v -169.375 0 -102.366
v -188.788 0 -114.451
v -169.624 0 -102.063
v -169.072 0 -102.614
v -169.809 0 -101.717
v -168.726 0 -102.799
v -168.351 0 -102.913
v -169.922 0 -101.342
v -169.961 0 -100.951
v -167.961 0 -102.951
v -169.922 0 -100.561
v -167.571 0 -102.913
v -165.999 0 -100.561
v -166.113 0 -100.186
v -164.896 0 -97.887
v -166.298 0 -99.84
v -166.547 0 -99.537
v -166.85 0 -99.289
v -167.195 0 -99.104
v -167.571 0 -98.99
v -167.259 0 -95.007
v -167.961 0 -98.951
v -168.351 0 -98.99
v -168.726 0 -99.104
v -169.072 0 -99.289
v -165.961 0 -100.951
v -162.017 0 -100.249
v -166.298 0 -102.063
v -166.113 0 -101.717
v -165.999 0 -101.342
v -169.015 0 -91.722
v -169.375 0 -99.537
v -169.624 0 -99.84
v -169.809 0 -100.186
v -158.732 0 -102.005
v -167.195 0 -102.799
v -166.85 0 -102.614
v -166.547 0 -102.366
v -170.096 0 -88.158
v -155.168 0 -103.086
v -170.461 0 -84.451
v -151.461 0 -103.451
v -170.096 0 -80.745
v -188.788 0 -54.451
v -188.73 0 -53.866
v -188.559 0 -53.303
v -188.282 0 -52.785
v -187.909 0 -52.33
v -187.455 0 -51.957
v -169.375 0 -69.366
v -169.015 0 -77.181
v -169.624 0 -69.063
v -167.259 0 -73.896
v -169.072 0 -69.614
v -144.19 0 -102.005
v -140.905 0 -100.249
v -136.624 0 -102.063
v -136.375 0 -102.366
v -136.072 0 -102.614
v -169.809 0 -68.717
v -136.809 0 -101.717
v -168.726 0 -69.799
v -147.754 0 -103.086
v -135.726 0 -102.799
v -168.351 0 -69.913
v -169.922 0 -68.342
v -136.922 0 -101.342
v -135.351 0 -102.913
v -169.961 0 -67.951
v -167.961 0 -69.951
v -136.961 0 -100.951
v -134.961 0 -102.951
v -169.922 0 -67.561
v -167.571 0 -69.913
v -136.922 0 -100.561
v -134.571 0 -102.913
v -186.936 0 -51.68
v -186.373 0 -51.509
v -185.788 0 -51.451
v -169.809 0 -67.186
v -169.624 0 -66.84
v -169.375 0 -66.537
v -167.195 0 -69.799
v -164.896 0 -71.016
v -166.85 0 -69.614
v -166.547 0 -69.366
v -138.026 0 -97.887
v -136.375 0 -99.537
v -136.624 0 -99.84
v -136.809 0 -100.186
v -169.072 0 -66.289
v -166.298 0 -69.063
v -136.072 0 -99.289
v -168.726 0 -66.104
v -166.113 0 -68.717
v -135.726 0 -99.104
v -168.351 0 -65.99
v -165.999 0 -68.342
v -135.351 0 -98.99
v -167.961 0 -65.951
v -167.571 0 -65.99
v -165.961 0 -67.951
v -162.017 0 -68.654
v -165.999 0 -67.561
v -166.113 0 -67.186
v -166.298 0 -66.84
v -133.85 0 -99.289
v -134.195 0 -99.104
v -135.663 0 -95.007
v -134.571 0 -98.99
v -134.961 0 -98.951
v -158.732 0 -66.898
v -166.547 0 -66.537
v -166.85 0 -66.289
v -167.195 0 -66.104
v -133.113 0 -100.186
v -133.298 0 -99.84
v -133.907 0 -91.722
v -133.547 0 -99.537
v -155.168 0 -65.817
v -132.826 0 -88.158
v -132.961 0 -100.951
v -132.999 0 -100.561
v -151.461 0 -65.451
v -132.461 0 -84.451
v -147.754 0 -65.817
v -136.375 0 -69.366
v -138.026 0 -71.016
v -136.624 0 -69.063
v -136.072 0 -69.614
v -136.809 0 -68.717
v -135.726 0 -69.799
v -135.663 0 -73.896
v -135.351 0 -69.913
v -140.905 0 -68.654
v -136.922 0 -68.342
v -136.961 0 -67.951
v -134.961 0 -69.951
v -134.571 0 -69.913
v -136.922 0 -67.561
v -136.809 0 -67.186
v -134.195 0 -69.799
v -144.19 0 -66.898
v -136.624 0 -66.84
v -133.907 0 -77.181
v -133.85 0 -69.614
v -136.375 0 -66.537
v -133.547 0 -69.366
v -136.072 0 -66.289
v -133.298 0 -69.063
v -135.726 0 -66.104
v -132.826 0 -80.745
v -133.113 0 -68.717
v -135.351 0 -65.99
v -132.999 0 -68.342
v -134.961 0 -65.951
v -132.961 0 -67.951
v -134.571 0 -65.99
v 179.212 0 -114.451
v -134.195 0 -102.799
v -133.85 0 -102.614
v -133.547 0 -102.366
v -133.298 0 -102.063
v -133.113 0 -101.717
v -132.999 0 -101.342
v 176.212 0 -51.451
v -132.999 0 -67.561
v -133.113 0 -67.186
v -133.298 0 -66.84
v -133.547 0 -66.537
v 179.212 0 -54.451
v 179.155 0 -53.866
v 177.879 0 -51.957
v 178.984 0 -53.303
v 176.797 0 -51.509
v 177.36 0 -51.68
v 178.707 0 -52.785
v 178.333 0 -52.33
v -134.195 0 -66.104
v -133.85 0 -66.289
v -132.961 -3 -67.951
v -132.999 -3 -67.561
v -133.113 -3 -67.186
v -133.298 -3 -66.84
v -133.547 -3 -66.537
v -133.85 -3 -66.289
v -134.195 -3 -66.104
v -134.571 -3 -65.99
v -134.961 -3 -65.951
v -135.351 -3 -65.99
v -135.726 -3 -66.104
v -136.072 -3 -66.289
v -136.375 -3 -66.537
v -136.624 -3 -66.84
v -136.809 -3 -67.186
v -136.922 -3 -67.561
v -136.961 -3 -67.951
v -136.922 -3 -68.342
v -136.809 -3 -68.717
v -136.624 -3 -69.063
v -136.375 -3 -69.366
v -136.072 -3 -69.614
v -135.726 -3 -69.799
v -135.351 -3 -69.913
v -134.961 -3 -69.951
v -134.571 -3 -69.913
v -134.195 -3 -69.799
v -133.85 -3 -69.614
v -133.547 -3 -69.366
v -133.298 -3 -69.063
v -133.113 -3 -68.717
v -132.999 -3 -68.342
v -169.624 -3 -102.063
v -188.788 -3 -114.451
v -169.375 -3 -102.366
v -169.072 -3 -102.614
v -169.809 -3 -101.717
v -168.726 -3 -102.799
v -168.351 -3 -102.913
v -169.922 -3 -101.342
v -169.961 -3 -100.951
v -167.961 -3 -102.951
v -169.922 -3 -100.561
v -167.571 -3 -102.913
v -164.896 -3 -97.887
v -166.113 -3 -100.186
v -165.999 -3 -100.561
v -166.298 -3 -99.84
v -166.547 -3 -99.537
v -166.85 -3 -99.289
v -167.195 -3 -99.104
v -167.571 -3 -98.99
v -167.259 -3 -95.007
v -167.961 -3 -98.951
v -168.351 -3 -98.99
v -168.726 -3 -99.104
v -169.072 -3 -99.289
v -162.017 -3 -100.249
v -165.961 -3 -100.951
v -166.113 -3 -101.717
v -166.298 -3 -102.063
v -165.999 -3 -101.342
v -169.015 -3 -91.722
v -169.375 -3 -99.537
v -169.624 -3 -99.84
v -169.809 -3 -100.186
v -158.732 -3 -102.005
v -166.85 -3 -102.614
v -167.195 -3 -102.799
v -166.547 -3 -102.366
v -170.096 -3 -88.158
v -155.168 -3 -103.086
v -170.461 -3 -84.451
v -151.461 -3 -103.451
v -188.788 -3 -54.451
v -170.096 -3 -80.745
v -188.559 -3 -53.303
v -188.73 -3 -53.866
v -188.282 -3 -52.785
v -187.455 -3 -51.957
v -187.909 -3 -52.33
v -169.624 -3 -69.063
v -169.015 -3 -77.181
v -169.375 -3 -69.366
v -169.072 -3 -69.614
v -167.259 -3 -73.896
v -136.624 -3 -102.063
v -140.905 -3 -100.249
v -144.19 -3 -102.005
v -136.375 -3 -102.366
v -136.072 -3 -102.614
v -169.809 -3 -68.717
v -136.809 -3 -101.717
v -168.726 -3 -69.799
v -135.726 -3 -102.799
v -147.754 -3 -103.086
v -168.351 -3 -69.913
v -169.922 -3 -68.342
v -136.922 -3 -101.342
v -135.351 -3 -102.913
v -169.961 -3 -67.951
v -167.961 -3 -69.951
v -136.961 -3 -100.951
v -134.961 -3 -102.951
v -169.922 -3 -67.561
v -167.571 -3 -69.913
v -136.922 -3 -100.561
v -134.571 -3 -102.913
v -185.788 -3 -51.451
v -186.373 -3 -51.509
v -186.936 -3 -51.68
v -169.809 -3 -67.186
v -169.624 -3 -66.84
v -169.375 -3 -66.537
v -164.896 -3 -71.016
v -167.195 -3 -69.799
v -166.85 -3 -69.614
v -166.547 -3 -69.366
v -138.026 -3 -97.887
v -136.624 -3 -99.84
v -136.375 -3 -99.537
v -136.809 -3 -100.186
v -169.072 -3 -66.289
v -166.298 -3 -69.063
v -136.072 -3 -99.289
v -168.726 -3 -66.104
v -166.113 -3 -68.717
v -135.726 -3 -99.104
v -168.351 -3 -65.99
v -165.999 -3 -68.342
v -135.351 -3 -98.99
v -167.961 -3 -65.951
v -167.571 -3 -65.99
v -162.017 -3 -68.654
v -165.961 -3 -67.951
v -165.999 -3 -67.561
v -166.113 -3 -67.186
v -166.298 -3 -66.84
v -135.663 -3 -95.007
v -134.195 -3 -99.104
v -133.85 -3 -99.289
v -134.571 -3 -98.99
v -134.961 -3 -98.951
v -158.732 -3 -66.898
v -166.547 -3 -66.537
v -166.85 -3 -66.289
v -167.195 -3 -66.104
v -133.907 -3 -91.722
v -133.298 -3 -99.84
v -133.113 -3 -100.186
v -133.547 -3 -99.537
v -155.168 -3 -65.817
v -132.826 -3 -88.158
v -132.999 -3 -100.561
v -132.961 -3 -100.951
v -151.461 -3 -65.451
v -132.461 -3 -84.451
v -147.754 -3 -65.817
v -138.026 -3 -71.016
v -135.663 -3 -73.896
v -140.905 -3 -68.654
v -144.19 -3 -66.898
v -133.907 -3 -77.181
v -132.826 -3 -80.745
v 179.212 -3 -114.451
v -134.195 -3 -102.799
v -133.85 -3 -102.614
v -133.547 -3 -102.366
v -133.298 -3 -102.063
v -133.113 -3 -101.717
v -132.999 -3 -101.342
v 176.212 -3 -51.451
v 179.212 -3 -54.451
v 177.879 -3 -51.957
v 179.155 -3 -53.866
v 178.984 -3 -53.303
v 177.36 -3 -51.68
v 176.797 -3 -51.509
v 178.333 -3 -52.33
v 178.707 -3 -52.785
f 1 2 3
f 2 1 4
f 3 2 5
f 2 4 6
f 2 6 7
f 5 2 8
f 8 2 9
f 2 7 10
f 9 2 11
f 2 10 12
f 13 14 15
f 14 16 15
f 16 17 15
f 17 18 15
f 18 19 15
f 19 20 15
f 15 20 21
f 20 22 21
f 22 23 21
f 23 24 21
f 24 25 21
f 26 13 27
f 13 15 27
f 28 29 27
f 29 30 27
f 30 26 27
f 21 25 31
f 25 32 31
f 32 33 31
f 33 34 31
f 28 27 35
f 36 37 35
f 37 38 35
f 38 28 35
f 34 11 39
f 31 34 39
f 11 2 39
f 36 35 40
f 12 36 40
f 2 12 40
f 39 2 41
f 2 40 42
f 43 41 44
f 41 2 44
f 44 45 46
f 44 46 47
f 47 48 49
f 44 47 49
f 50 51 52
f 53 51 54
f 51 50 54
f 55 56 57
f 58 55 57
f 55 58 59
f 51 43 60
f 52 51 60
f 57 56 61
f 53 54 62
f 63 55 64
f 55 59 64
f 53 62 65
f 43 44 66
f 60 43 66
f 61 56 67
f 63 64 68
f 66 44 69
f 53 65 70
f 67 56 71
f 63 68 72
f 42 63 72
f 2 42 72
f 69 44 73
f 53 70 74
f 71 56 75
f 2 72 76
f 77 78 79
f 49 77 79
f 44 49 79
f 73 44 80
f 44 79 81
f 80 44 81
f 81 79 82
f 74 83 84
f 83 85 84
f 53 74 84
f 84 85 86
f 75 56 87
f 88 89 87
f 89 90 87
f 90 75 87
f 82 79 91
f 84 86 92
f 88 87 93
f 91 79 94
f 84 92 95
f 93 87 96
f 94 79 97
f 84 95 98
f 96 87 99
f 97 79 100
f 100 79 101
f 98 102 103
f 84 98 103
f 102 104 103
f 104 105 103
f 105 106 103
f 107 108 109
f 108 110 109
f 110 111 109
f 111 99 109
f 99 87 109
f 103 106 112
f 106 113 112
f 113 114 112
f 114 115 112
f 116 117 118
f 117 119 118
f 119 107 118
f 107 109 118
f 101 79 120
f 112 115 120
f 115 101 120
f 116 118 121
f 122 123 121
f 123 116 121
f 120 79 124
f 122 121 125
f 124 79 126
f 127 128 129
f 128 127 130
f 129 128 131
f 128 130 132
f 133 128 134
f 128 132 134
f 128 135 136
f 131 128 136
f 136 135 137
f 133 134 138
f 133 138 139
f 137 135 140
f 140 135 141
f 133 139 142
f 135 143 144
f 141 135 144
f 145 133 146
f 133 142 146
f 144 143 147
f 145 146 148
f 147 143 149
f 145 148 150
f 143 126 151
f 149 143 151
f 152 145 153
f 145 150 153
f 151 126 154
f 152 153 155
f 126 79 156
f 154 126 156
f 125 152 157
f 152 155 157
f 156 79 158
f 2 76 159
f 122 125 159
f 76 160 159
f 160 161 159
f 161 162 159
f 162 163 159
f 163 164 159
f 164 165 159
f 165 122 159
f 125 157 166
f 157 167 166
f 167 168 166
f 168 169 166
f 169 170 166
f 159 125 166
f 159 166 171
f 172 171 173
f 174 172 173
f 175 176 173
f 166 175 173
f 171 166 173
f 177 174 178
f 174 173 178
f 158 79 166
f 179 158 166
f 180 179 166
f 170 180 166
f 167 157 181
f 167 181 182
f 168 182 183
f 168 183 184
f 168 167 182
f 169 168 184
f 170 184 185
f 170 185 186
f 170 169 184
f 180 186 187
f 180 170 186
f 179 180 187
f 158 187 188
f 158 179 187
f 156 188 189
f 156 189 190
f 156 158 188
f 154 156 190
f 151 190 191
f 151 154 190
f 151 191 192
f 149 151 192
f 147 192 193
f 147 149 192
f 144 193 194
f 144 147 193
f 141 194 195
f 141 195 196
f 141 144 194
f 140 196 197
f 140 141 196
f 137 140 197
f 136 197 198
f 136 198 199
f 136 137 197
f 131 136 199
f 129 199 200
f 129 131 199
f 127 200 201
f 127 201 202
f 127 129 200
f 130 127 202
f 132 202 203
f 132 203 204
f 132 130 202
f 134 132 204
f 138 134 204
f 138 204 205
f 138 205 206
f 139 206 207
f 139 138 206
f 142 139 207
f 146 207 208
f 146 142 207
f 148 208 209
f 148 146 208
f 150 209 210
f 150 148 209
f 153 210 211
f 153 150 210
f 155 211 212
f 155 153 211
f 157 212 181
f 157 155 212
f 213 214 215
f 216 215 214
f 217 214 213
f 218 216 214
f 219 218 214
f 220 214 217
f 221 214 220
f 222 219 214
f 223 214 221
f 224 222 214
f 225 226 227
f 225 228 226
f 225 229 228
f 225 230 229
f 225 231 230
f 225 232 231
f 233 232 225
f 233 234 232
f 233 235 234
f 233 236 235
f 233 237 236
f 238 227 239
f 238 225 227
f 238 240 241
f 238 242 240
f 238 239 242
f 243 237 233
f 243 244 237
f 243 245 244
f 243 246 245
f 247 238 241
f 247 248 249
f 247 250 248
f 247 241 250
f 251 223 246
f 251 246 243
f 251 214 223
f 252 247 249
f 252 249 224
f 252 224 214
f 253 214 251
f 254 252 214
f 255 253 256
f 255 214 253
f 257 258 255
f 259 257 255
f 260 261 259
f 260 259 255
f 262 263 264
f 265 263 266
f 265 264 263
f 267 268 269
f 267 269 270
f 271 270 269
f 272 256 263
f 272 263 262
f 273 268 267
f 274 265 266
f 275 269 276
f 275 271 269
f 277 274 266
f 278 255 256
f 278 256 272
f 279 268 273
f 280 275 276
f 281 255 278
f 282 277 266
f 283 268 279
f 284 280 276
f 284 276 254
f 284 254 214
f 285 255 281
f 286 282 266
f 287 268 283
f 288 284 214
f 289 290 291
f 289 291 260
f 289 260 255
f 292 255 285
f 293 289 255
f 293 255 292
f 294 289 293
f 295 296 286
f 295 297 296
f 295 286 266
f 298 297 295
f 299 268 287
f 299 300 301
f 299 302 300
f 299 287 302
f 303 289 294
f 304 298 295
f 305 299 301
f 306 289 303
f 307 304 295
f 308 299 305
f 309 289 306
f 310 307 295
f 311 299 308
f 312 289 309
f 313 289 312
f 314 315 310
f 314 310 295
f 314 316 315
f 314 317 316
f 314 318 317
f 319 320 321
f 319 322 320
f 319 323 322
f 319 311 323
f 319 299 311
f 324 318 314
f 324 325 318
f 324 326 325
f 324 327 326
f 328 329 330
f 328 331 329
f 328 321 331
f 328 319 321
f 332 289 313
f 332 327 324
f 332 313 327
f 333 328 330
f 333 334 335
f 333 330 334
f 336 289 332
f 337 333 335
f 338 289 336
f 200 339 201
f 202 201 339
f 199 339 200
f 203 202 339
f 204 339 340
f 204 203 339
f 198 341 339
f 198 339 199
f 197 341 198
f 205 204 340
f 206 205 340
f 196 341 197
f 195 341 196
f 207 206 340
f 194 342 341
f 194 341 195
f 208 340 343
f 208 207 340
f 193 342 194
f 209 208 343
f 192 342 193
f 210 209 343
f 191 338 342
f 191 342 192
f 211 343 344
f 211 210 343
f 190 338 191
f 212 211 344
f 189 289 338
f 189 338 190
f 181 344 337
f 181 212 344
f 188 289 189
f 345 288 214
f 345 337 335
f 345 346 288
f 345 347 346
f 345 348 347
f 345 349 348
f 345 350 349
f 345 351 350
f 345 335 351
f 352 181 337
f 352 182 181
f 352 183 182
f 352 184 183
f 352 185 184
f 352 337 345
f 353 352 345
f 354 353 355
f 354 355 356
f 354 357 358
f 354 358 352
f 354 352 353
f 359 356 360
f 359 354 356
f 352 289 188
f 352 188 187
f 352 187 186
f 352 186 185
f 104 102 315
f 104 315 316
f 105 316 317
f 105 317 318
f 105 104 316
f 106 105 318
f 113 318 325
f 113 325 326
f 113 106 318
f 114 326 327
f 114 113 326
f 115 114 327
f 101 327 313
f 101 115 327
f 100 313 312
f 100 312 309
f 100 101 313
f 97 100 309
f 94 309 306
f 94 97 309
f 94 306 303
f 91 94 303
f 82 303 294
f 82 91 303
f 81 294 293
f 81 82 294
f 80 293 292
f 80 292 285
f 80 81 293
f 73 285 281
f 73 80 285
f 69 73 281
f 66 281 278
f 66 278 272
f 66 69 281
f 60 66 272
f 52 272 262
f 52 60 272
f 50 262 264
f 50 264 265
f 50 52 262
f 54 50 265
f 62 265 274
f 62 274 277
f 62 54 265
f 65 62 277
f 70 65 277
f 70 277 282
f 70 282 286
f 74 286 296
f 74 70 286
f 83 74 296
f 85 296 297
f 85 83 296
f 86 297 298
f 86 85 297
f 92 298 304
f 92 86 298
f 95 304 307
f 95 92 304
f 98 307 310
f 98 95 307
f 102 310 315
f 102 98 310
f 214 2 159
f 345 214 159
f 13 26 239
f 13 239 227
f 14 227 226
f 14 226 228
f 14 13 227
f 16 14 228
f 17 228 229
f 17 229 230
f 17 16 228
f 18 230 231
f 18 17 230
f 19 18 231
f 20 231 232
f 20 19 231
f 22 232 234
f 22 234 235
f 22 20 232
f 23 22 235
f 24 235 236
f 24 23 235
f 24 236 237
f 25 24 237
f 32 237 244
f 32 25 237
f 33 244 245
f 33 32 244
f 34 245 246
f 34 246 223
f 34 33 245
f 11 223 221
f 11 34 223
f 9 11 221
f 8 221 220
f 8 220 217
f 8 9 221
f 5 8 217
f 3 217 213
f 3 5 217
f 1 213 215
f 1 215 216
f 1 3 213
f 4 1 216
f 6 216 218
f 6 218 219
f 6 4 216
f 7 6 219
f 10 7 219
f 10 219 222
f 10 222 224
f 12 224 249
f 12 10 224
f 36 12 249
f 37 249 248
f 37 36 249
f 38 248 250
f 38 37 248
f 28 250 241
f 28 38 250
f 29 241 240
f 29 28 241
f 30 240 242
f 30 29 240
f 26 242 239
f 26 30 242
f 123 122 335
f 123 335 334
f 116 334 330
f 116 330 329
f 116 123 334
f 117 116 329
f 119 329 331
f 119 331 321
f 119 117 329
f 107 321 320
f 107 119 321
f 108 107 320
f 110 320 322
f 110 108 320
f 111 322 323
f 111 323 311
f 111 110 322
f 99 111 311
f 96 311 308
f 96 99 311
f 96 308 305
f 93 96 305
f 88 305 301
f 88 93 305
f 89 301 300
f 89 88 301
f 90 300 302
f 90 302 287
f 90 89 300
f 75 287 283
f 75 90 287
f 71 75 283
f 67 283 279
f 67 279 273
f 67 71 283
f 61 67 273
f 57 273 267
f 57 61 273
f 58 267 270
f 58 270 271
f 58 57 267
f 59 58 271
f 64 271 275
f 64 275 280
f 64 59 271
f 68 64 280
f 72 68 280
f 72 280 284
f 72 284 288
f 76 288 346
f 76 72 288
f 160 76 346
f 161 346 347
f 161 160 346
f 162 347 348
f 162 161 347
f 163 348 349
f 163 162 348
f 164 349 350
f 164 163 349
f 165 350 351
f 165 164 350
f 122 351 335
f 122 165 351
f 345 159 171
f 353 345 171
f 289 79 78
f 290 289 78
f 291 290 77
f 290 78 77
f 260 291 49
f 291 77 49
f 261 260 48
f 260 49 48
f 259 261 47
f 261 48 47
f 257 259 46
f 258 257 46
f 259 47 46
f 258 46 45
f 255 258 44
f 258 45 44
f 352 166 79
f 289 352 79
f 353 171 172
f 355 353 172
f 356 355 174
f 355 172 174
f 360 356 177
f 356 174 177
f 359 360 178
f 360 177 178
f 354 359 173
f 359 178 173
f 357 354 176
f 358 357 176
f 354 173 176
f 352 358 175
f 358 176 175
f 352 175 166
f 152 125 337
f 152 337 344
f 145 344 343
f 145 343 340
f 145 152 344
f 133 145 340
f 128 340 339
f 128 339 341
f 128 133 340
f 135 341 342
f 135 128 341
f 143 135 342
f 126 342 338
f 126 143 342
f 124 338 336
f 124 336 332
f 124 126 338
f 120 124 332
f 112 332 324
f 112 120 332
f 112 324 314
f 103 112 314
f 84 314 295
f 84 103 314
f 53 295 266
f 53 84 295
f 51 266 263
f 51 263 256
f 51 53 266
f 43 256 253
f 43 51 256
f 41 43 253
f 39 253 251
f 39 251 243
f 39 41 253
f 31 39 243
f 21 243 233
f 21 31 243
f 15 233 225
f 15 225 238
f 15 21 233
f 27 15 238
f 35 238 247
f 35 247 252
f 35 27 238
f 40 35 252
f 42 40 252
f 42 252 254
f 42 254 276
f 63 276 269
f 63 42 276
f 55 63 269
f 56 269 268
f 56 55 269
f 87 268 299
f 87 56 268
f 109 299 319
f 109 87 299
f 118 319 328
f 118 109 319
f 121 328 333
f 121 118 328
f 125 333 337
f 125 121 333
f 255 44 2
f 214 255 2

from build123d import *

# Parameters (mm, degrees)
F0_R     = 2
F0_R_2   = 19
F1_DEPTH = 3


with BuildPart() as f1:
    # F0 (on Front) → F1 (new body)
    with BuildSketch(Plane.XZ):
        with BuildLine():
            Line((176.212173, -51.451489), (-185.787827, -51.451489))
            ThreePointArc((-185.787827, -51.451489), (-187.909148, -52.330169), (-188.787827, -54.451489))
            Line((-188.787827, -54.451489), (-188.787827, -114.451489))
            Line((-188.787827, -114.451489), (179.212173, -114.451489))
            Line((179.212173, -114.451489), (179.212173, -54.451489))
            ThreePointArc((179.212173, -54.451489), (178.333493, -52.330169), (176.212173, -51.451489))
        make_face()
        with Locations((-167.960797, -100.951489)):
            Circle(F0_R, mode=Mode.SUBTRACT)
        with Locations((-134.960797, -100.951489)):
            Circle(F0_R, mode=Mode.SUBTRACT)
        with Locations((-151.460797, -84.451489)):
            Circle(F0_R_2, mode=Mode.SUBTRACT)
        with Locations((-167.960797, -67.951489)):
            Circle(F0_R, mode=Mode.SUBTRACT)
        with Locations((-134.960797, -67.951489)):
            Circle(F0_R, mode=Mode.SUBTRACT)
    extrude(amount=F1_DEPTH)


solid = f1.part
